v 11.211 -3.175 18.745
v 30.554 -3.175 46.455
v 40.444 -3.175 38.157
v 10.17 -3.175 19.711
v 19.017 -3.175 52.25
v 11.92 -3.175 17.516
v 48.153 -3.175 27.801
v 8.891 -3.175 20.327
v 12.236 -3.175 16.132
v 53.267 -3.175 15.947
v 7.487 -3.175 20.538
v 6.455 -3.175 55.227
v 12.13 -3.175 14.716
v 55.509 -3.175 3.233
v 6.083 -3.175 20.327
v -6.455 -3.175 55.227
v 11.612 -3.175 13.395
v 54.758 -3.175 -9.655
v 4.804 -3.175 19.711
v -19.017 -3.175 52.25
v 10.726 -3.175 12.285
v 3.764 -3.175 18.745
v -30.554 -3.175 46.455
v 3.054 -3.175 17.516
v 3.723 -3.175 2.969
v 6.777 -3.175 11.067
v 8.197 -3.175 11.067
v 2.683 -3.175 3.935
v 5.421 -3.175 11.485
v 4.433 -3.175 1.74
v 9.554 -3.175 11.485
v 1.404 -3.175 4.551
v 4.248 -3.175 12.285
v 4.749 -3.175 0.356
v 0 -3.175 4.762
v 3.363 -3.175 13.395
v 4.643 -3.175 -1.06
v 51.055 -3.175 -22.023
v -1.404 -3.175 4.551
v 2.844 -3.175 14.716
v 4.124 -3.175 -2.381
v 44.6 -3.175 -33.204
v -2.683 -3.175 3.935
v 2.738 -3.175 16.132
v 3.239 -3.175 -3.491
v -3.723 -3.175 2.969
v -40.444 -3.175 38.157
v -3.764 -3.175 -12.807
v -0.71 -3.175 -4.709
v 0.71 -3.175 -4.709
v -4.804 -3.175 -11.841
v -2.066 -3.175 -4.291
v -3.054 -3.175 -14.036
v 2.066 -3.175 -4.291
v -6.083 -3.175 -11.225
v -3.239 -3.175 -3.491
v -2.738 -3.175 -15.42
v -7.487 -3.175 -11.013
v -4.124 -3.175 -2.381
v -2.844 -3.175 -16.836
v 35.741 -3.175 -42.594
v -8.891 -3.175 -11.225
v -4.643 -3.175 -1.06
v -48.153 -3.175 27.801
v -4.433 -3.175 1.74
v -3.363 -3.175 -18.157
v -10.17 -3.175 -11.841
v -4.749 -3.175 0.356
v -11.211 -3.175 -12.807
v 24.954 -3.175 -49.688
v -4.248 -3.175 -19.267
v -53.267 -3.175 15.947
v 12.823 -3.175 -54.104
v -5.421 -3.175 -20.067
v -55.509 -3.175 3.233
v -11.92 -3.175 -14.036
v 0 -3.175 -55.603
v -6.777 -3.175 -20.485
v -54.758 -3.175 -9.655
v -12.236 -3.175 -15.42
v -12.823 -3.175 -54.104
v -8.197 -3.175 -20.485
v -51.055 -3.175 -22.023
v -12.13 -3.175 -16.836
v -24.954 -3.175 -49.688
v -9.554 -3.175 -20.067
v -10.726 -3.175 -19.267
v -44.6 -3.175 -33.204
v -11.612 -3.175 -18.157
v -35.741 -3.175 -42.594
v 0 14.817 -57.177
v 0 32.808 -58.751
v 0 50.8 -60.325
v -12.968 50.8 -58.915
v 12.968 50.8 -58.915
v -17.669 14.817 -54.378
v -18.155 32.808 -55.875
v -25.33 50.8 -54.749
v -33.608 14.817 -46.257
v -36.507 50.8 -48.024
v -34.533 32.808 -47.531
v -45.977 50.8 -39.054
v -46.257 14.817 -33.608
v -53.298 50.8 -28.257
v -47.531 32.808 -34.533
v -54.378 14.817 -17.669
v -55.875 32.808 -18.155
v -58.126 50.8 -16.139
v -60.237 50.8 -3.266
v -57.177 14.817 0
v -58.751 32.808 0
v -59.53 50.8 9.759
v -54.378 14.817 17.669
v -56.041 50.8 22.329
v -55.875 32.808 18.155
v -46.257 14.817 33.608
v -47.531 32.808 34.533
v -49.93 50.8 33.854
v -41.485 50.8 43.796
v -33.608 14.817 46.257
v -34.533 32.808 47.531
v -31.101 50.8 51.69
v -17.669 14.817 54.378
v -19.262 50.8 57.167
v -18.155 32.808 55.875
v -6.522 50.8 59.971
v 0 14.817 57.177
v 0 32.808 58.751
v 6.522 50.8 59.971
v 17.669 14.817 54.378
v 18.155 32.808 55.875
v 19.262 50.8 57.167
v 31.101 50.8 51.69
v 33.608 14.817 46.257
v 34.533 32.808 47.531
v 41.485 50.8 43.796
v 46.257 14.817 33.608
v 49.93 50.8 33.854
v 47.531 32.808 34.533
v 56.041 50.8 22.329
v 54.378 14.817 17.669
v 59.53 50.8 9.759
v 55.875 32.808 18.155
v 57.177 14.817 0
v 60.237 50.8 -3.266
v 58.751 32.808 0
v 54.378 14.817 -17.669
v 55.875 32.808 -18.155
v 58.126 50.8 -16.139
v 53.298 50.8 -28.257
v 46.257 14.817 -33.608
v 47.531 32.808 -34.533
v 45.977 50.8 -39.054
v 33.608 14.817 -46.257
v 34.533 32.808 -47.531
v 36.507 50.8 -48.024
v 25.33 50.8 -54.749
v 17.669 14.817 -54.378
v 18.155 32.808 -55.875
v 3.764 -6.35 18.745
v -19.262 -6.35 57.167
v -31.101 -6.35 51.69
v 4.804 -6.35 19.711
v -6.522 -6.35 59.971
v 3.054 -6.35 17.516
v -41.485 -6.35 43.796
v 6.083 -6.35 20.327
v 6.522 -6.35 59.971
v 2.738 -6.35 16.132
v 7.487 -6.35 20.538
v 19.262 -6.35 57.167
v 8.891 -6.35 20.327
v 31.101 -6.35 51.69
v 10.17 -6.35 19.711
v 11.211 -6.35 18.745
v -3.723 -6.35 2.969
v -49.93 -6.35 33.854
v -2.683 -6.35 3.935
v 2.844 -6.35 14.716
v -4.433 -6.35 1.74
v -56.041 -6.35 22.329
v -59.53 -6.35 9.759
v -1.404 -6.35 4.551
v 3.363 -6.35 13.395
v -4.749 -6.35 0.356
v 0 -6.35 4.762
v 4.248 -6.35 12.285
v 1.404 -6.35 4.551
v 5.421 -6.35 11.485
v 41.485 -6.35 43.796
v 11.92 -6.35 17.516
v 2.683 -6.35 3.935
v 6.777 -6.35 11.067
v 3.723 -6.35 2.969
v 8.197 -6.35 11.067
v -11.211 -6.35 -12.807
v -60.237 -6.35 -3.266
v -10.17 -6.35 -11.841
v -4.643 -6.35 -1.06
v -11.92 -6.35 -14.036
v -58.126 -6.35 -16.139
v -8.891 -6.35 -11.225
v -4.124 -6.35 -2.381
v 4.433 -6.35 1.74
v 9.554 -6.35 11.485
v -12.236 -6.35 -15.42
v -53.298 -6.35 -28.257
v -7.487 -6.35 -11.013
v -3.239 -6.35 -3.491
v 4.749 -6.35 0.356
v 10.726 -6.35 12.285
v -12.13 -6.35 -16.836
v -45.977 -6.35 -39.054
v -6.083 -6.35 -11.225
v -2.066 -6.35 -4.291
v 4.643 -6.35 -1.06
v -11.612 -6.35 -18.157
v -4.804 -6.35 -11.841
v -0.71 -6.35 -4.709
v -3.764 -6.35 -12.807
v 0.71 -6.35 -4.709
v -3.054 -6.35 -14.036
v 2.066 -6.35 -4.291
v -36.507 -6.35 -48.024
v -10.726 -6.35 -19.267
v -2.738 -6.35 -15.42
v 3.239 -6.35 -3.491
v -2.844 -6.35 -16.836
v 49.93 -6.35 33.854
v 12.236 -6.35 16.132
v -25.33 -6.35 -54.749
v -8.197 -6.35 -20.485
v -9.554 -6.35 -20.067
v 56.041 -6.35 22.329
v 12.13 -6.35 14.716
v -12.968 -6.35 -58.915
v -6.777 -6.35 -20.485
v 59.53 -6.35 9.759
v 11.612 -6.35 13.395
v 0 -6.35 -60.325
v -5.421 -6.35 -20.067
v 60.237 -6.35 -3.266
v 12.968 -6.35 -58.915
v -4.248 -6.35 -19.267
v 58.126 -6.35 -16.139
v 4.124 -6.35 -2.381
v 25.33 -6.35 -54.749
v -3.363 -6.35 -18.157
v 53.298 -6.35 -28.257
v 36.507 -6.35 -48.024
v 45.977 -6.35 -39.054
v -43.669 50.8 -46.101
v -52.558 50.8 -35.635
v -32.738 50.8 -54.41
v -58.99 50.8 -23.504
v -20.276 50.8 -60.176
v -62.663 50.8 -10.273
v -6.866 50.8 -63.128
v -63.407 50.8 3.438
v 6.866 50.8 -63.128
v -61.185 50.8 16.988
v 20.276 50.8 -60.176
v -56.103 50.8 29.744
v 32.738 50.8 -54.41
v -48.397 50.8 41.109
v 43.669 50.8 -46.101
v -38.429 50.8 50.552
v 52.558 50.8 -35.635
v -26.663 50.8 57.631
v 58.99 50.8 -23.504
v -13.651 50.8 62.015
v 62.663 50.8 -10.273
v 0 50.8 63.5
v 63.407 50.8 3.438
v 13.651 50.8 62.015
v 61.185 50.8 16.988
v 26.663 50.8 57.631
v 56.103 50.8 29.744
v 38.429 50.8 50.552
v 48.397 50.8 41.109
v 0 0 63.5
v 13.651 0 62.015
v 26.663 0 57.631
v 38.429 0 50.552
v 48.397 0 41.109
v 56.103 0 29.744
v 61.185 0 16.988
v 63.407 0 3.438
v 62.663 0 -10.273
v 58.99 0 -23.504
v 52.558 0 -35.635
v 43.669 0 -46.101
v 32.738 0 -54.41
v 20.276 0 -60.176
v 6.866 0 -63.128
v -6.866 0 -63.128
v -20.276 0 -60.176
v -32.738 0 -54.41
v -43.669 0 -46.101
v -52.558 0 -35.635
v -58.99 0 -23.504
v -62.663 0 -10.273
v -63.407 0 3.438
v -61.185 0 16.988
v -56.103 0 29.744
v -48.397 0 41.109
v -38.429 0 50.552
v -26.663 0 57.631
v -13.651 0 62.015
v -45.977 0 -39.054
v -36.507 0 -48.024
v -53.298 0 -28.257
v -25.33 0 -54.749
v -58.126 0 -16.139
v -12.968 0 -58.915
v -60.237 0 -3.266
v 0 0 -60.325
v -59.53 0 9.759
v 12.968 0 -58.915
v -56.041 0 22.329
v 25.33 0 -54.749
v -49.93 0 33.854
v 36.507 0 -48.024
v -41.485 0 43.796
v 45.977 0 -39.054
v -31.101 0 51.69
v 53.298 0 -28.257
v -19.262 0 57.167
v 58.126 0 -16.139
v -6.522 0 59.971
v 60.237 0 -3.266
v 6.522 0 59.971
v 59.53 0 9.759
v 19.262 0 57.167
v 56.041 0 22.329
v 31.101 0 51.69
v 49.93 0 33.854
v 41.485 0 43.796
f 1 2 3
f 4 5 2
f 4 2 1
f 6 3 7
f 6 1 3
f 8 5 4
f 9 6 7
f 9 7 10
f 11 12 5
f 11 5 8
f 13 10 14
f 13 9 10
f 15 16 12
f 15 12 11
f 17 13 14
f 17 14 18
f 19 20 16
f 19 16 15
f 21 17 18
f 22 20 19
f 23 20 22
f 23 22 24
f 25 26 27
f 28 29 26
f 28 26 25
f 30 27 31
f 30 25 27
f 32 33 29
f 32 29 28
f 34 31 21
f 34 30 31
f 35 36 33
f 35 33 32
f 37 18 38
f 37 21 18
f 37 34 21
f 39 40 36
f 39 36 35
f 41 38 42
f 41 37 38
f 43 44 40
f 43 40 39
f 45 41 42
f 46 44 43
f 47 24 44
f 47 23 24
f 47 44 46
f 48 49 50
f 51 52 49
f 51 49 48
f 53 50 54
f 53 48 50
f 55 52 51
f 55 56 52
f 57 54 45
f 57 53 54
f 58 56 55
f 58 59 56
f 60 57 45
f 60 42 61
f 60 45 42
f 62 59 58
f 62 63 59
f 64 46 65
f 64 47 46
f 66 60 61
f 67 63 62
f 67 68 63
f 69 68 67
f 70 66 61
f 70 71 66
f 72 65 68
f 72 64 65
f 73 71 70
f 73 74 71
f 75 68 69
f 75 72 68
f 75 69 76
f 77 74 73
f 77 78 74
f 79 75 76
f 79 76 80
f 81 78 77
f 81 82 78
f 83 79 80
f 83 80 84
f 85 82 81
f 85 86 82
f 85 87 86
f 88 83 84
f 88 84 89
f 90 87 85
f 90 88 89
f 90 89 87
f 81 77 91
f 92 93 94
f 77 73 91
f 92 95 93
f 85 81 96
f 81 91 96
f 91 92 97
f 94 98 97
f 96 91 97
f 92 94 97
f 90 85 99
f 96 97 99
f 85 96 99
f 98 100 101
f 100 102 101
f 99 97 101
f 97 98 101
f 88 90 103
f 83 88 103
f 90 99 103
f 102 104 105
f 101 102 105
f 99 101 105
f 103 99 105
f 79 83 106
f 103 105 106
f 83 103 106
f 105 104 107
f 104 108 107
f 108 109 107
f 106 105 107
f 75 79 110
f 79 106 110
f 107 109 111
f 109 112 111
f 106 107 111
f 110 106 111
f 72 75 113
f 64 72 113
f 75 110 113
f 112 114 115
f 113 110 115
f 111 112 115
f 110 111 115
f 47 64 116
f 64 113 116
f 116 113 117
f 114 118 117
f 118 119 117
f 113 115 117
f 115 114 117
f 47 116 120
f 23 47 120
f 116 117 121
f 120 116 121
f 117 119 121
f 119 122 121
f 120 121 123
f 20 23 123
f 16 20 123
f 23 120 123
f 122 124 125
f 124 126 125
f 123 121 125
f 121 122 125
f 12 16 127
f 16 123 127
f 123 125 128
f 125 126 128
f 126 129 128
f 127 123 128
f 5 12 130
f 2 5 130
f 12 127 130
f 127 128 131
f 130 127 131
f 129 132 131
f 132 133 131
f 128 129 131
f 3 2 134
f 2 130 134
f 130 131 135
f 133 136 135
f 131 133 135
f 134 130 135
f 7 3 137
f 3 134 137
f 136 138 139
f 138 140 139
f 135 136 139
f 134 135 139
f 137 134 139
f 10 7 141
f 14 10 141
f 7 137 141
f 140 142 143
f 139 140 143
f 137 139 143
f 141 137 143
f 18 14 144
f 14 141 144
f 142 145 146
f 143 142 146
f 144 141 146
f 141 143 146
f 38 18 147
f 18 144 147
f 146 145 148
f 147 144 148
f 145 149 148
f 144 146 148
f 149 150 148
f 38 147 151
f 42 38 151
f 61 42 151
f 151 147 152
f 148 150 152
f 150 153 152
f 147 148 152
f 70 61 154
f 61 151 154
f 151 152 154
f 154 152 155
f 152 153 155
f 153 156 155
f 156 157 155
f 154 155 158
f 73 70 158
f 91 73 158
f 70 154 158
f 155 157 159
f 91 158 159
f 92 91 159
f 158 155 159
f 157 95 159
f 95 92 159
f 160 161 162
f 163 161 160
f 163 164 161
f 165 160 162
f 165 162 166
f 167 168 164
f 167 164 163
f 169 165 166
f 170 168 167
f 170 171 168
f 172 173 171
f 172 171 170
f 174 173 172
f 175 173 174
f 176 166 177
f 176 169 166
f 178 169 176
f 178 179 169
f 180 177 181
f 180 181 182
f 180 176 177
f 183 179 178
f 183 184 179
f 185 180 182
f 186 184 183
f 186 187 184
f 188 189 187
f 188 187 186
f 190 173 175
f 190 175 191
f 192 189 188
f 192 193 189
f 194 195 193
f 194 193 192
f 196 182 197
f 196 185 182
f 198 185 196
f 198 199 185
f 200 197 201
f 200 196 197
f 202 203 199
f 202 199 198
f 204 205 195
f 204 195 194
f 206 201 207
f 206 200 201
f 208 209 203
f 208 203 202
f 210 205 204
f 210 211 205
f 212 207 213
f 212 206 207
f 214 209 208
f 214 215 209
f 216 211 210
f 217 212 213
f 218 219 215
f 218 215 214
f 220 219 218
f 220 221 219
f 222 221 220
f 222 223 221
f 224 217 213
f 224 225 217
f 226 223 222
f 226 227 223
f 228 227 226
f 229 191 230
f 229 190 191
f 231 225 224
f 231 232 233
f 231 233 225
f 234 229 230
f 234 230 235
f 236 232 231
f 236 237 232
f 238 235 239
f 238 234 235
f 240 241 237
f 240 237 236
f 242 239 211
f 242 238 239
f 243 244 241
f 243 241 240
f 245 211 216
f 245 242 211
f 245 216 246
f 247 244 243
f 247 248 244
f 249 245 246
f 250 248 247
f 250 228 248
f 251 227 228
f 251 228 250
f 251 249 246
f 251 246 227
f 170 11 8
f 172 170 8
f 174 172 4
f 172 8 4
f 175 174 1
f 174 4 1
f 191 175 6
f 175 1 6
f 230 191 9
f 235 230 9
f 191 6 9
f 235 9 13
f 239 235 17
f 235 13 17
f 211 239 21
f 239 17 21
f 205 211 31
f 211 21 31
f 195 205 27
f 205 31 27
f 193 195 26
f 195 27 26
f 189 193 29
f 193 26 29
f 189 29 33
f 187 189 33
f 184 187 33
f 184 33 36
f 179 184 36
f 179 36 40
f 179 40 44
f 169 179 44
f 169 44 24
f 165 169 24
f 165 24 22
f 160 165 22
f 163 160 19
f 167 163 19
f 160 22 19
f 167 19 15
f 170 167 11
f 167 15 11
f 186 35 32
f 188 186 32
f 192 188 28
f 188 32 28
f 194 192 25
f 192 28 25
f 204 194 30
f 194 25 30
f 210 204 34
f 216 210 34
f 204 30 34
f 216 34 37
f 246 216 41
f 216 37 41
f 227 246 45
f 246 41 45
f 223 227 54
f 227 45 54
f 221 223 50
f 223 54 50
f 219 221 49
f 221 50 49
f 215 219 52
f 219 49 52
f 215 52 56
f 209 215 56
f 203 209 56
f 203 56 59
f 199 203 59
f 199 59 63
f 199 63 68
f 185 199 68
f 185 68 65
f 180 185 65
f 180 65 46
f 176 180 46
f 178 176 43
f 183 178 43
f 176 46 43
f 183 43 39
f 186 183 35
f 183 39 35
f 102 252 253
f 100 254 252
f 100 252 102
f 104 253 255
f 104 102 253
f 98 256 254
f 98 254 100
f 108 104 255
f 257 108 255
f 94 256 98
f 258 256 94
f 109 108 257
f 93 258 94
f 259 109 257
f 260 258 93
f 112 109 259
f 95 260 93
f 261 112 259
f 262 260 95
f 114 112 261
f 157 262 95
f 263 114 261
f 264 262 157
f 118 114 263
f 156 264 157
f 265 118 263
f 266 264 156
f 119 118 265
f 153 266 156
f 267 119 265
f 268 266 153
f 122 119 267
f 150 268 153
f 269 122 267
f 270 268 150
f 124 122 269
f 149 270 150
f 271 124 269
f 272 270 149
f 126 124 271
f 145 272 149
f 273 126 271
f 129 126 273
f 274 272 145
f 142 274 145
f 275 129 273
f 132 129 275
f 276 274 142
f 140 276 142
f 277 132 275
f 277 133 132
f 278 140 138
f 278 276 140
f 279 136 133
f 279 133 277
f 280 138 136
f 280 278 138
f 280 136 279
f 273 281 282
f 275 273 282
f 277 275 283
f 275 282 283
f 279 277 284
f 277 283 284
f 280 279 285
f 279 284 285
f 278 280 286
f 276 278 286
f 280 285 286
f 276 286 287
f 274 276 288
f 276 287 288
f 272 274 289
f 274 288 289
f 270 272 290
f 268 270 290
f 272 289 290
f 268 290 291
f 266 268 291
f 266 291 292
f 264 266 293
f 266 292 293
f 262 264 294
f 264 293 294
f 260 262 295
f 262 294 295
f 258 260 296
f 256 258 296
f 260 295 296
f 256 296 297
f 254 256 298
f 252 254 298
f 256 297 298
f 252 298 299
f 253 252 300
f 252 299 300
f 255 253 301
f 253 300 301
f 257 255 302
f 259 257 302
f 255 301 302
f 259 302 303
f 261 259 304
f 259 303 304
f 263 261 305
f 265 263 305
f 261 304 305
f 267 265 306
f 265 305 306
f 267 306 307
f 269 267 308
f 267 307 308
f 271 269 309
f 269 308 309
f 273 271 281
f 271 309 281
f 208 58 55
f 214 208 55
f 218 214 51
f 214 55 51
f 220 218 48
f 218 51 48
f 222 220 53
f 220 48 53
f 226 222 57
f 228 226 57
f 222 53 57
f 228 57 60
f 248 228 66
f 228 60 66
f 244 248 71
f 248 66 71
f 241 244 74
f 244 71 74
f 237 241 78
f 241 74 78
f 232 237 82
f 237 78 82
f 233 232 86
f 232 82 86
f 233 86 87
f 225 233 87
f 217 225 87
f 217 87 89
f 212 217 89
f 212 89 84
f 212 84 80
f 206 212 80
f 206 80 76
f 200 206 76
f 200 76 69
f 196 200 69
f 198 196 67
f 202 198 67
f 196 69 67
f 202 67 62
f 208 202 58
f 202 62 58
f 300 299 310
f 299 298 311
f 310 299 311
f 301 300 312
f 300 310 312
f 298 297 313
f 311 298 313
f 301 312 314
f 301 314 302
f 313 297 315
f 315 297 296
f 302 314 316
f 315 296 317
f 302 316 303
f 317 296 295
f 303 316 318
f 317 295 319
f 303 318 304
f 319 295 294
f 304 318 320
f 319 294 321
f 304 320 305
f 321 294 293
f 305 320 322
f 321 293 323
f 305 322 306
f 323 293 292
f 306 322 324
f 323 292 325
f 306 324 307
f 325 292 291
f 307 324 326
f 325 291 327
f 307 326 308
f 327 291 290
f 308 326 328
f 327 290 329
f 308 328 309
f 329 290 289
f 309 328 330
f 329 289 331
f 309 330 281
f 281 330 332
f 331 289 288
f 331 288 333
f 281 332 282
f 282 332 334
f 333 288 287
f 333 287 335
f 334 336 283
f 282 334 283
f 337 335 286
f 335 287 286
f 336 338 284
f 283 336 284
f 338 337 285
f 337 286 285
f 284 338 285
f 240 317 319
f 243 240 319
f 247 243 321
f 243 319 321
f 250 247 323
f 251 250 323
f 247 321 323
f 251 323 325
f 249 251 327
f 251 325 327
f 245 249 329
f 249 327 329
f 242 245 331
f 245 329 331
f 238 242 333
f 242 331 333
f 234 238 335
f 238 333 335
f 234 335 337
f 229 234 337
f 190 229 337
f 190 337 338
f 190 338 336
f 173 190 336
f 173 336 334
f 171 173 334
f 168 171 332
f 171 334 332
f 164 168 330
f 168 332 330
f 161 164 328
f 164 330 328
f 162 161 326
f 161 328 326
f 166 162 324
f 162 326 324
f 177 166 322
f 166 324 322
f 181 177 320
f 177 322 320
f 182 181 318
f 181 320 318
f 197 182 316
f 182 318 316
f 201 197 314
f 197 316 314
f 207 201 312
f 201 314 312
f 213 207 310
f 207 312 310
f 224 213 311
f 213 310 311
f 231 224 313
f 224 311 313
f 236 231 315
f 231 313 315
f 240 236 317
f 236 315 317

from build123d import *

# Parameters (mm, degrees)
SKETCH1_R           = 63.5
BOSS_EXTRUDE1_DEPTH = 50.8
SKETCH2_R           = 60.325
SKETCH2_R_2         = 57.15
BOSS_EXTRUDE2_DEPTH = 6.35
SKETCH3_R           = 60.325
CUT_EXTRUDE1_DEPTH  = 53.975
CUT_EXTRUDE1_DRAFT  = -5
SKETCH4_R           = 4.7625
CUT_EXTRUDE3_DEPTH  = 3.175


with BuildPart() as part:
    # Sketch1 → Boss-Extrude1 (new body)
    with BuildSketch(Plane(origin=(0, 0, 0), x_dir=(1, 0, 0), z_dir=(0, 1, 0))):
        with Locations(Location((0, 0, 0), (0, 0, 270))):
            Circle(SKETCH1_R)
    extrude(amount=BOSS_EXTRUDE1_DEPTH)

    # Sketch2 → Boss-Extrude2 (add)
    with BuildSketch(Plane.XZ):
        with Locations(Location((0, 0, 0), (0, 0, 270))):
            Circle(SKETCH2_R)
        Circle(SKETCH2_R_2, mode=Mode.SUBTRACT)
        Circle(SKETCH2_R_2)
    extrude(amount=BOSS_EXTRUDE2_DEPTH)


with BuildPart() as cut_extrude1_tool:
    # Sketch3 → Cut-Extrude1 (with draft: the straight prism first)
    with BuildSketch(Plane(origin=(0, 50.8, 0), x_dir=(1, 0, 0), z_dir=(0, 1, 0))):
        with Locations(Location((0, 0, 0), (0, 0, 90))):
            Circle(SKETCH3_R)
    extrude(amount=-CUT_EXTRUDE1_DEPTH)
    # Cut-Extrude1: the draft: its side faces are tilted about the plane it starts from
    cut_extrude1_sides = [cut_extrude1_tool.faces().sort_by_distance(p)[0] for p in [
        (0, 23.8125, 60.325),
    ]]
    draft(cut_extrude1_sides, Plane(origin=(0, 50.8, 0), x_dir=(1, 0, 0), z_dir=(0, 1, 0)), CUT_EXTRUDE1_DRAFT)


with BuildPart() as part_1:
    add(part.part)

    # Cut-Extrude1: cut by cut_extrude1_tool
    add(cut_extrude1_tool.part, mode=Mode.SUBTRACT)

    # Sketch4 → Cut-Extrude3 (cut)
    with BuildSketch(Plane(origin=(0, -3.175, 0), x_dir=(1, 0, 0), z_dir=(0, 1, 0))):
        with Locations(Location((7.487131795, -15.775986934, 0), (0, 0, 270))):
            Circle(SKETCH4_R)
        with Locations(Location((0, 0, 0), (0, 0, 270))):
            Circle(SKETCH4_R)
        with Locations(Location((-7.487131795, 15.775986934, 0), (0, 0, 270))):
            Circle(SKETCH4_R)
    extrude(amount=-CUT_EXTRUDE3_DEPTH, mode=Mode.SUBTRACT)


solid = part_1.part
